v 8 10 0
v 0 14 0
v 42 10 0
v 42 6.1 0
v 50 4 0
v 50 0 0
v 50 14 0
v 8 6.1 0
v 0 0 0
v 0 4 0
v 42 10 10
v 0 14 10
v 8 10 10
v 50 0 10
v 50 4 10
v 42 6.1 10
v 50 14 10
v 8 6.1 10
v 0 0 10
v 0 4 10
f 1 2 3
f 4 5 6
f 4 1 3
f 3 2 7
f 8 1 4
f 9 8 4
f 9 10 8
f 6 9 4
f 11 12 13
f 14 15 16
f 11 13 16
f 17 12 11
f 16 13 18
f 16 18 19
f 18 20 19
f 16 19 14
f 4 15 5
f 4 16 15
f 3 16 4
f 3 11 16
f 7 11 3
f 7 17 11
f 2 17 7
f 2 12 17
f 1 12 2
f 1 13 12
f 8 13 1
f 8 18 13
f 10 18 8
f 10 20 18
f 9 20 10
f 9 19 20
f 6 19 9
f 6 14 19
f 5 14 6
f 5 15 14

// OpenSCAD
$fn = 32;

// ----------------------------------------------------------------------
// Key bar: dovetail key, 10 mm thick
// ----------------------------------------------------------------------

// --- parameters (mm) ---
profile_height = 10;      // extrusion height
profile_points = 10;      // points of the closed outline

profile = [[0, 0], [50, 0], [50, 4], [42, 6.1], [42, 10], [50, 14], [0, 14], [8, 10], [8, 6.1], [0, 4]];  // single closed polygon, 10 points, counter clockwise

// --- the one profile operation ---
linear_extrude(height = profile_height) polygon(points = profile);
